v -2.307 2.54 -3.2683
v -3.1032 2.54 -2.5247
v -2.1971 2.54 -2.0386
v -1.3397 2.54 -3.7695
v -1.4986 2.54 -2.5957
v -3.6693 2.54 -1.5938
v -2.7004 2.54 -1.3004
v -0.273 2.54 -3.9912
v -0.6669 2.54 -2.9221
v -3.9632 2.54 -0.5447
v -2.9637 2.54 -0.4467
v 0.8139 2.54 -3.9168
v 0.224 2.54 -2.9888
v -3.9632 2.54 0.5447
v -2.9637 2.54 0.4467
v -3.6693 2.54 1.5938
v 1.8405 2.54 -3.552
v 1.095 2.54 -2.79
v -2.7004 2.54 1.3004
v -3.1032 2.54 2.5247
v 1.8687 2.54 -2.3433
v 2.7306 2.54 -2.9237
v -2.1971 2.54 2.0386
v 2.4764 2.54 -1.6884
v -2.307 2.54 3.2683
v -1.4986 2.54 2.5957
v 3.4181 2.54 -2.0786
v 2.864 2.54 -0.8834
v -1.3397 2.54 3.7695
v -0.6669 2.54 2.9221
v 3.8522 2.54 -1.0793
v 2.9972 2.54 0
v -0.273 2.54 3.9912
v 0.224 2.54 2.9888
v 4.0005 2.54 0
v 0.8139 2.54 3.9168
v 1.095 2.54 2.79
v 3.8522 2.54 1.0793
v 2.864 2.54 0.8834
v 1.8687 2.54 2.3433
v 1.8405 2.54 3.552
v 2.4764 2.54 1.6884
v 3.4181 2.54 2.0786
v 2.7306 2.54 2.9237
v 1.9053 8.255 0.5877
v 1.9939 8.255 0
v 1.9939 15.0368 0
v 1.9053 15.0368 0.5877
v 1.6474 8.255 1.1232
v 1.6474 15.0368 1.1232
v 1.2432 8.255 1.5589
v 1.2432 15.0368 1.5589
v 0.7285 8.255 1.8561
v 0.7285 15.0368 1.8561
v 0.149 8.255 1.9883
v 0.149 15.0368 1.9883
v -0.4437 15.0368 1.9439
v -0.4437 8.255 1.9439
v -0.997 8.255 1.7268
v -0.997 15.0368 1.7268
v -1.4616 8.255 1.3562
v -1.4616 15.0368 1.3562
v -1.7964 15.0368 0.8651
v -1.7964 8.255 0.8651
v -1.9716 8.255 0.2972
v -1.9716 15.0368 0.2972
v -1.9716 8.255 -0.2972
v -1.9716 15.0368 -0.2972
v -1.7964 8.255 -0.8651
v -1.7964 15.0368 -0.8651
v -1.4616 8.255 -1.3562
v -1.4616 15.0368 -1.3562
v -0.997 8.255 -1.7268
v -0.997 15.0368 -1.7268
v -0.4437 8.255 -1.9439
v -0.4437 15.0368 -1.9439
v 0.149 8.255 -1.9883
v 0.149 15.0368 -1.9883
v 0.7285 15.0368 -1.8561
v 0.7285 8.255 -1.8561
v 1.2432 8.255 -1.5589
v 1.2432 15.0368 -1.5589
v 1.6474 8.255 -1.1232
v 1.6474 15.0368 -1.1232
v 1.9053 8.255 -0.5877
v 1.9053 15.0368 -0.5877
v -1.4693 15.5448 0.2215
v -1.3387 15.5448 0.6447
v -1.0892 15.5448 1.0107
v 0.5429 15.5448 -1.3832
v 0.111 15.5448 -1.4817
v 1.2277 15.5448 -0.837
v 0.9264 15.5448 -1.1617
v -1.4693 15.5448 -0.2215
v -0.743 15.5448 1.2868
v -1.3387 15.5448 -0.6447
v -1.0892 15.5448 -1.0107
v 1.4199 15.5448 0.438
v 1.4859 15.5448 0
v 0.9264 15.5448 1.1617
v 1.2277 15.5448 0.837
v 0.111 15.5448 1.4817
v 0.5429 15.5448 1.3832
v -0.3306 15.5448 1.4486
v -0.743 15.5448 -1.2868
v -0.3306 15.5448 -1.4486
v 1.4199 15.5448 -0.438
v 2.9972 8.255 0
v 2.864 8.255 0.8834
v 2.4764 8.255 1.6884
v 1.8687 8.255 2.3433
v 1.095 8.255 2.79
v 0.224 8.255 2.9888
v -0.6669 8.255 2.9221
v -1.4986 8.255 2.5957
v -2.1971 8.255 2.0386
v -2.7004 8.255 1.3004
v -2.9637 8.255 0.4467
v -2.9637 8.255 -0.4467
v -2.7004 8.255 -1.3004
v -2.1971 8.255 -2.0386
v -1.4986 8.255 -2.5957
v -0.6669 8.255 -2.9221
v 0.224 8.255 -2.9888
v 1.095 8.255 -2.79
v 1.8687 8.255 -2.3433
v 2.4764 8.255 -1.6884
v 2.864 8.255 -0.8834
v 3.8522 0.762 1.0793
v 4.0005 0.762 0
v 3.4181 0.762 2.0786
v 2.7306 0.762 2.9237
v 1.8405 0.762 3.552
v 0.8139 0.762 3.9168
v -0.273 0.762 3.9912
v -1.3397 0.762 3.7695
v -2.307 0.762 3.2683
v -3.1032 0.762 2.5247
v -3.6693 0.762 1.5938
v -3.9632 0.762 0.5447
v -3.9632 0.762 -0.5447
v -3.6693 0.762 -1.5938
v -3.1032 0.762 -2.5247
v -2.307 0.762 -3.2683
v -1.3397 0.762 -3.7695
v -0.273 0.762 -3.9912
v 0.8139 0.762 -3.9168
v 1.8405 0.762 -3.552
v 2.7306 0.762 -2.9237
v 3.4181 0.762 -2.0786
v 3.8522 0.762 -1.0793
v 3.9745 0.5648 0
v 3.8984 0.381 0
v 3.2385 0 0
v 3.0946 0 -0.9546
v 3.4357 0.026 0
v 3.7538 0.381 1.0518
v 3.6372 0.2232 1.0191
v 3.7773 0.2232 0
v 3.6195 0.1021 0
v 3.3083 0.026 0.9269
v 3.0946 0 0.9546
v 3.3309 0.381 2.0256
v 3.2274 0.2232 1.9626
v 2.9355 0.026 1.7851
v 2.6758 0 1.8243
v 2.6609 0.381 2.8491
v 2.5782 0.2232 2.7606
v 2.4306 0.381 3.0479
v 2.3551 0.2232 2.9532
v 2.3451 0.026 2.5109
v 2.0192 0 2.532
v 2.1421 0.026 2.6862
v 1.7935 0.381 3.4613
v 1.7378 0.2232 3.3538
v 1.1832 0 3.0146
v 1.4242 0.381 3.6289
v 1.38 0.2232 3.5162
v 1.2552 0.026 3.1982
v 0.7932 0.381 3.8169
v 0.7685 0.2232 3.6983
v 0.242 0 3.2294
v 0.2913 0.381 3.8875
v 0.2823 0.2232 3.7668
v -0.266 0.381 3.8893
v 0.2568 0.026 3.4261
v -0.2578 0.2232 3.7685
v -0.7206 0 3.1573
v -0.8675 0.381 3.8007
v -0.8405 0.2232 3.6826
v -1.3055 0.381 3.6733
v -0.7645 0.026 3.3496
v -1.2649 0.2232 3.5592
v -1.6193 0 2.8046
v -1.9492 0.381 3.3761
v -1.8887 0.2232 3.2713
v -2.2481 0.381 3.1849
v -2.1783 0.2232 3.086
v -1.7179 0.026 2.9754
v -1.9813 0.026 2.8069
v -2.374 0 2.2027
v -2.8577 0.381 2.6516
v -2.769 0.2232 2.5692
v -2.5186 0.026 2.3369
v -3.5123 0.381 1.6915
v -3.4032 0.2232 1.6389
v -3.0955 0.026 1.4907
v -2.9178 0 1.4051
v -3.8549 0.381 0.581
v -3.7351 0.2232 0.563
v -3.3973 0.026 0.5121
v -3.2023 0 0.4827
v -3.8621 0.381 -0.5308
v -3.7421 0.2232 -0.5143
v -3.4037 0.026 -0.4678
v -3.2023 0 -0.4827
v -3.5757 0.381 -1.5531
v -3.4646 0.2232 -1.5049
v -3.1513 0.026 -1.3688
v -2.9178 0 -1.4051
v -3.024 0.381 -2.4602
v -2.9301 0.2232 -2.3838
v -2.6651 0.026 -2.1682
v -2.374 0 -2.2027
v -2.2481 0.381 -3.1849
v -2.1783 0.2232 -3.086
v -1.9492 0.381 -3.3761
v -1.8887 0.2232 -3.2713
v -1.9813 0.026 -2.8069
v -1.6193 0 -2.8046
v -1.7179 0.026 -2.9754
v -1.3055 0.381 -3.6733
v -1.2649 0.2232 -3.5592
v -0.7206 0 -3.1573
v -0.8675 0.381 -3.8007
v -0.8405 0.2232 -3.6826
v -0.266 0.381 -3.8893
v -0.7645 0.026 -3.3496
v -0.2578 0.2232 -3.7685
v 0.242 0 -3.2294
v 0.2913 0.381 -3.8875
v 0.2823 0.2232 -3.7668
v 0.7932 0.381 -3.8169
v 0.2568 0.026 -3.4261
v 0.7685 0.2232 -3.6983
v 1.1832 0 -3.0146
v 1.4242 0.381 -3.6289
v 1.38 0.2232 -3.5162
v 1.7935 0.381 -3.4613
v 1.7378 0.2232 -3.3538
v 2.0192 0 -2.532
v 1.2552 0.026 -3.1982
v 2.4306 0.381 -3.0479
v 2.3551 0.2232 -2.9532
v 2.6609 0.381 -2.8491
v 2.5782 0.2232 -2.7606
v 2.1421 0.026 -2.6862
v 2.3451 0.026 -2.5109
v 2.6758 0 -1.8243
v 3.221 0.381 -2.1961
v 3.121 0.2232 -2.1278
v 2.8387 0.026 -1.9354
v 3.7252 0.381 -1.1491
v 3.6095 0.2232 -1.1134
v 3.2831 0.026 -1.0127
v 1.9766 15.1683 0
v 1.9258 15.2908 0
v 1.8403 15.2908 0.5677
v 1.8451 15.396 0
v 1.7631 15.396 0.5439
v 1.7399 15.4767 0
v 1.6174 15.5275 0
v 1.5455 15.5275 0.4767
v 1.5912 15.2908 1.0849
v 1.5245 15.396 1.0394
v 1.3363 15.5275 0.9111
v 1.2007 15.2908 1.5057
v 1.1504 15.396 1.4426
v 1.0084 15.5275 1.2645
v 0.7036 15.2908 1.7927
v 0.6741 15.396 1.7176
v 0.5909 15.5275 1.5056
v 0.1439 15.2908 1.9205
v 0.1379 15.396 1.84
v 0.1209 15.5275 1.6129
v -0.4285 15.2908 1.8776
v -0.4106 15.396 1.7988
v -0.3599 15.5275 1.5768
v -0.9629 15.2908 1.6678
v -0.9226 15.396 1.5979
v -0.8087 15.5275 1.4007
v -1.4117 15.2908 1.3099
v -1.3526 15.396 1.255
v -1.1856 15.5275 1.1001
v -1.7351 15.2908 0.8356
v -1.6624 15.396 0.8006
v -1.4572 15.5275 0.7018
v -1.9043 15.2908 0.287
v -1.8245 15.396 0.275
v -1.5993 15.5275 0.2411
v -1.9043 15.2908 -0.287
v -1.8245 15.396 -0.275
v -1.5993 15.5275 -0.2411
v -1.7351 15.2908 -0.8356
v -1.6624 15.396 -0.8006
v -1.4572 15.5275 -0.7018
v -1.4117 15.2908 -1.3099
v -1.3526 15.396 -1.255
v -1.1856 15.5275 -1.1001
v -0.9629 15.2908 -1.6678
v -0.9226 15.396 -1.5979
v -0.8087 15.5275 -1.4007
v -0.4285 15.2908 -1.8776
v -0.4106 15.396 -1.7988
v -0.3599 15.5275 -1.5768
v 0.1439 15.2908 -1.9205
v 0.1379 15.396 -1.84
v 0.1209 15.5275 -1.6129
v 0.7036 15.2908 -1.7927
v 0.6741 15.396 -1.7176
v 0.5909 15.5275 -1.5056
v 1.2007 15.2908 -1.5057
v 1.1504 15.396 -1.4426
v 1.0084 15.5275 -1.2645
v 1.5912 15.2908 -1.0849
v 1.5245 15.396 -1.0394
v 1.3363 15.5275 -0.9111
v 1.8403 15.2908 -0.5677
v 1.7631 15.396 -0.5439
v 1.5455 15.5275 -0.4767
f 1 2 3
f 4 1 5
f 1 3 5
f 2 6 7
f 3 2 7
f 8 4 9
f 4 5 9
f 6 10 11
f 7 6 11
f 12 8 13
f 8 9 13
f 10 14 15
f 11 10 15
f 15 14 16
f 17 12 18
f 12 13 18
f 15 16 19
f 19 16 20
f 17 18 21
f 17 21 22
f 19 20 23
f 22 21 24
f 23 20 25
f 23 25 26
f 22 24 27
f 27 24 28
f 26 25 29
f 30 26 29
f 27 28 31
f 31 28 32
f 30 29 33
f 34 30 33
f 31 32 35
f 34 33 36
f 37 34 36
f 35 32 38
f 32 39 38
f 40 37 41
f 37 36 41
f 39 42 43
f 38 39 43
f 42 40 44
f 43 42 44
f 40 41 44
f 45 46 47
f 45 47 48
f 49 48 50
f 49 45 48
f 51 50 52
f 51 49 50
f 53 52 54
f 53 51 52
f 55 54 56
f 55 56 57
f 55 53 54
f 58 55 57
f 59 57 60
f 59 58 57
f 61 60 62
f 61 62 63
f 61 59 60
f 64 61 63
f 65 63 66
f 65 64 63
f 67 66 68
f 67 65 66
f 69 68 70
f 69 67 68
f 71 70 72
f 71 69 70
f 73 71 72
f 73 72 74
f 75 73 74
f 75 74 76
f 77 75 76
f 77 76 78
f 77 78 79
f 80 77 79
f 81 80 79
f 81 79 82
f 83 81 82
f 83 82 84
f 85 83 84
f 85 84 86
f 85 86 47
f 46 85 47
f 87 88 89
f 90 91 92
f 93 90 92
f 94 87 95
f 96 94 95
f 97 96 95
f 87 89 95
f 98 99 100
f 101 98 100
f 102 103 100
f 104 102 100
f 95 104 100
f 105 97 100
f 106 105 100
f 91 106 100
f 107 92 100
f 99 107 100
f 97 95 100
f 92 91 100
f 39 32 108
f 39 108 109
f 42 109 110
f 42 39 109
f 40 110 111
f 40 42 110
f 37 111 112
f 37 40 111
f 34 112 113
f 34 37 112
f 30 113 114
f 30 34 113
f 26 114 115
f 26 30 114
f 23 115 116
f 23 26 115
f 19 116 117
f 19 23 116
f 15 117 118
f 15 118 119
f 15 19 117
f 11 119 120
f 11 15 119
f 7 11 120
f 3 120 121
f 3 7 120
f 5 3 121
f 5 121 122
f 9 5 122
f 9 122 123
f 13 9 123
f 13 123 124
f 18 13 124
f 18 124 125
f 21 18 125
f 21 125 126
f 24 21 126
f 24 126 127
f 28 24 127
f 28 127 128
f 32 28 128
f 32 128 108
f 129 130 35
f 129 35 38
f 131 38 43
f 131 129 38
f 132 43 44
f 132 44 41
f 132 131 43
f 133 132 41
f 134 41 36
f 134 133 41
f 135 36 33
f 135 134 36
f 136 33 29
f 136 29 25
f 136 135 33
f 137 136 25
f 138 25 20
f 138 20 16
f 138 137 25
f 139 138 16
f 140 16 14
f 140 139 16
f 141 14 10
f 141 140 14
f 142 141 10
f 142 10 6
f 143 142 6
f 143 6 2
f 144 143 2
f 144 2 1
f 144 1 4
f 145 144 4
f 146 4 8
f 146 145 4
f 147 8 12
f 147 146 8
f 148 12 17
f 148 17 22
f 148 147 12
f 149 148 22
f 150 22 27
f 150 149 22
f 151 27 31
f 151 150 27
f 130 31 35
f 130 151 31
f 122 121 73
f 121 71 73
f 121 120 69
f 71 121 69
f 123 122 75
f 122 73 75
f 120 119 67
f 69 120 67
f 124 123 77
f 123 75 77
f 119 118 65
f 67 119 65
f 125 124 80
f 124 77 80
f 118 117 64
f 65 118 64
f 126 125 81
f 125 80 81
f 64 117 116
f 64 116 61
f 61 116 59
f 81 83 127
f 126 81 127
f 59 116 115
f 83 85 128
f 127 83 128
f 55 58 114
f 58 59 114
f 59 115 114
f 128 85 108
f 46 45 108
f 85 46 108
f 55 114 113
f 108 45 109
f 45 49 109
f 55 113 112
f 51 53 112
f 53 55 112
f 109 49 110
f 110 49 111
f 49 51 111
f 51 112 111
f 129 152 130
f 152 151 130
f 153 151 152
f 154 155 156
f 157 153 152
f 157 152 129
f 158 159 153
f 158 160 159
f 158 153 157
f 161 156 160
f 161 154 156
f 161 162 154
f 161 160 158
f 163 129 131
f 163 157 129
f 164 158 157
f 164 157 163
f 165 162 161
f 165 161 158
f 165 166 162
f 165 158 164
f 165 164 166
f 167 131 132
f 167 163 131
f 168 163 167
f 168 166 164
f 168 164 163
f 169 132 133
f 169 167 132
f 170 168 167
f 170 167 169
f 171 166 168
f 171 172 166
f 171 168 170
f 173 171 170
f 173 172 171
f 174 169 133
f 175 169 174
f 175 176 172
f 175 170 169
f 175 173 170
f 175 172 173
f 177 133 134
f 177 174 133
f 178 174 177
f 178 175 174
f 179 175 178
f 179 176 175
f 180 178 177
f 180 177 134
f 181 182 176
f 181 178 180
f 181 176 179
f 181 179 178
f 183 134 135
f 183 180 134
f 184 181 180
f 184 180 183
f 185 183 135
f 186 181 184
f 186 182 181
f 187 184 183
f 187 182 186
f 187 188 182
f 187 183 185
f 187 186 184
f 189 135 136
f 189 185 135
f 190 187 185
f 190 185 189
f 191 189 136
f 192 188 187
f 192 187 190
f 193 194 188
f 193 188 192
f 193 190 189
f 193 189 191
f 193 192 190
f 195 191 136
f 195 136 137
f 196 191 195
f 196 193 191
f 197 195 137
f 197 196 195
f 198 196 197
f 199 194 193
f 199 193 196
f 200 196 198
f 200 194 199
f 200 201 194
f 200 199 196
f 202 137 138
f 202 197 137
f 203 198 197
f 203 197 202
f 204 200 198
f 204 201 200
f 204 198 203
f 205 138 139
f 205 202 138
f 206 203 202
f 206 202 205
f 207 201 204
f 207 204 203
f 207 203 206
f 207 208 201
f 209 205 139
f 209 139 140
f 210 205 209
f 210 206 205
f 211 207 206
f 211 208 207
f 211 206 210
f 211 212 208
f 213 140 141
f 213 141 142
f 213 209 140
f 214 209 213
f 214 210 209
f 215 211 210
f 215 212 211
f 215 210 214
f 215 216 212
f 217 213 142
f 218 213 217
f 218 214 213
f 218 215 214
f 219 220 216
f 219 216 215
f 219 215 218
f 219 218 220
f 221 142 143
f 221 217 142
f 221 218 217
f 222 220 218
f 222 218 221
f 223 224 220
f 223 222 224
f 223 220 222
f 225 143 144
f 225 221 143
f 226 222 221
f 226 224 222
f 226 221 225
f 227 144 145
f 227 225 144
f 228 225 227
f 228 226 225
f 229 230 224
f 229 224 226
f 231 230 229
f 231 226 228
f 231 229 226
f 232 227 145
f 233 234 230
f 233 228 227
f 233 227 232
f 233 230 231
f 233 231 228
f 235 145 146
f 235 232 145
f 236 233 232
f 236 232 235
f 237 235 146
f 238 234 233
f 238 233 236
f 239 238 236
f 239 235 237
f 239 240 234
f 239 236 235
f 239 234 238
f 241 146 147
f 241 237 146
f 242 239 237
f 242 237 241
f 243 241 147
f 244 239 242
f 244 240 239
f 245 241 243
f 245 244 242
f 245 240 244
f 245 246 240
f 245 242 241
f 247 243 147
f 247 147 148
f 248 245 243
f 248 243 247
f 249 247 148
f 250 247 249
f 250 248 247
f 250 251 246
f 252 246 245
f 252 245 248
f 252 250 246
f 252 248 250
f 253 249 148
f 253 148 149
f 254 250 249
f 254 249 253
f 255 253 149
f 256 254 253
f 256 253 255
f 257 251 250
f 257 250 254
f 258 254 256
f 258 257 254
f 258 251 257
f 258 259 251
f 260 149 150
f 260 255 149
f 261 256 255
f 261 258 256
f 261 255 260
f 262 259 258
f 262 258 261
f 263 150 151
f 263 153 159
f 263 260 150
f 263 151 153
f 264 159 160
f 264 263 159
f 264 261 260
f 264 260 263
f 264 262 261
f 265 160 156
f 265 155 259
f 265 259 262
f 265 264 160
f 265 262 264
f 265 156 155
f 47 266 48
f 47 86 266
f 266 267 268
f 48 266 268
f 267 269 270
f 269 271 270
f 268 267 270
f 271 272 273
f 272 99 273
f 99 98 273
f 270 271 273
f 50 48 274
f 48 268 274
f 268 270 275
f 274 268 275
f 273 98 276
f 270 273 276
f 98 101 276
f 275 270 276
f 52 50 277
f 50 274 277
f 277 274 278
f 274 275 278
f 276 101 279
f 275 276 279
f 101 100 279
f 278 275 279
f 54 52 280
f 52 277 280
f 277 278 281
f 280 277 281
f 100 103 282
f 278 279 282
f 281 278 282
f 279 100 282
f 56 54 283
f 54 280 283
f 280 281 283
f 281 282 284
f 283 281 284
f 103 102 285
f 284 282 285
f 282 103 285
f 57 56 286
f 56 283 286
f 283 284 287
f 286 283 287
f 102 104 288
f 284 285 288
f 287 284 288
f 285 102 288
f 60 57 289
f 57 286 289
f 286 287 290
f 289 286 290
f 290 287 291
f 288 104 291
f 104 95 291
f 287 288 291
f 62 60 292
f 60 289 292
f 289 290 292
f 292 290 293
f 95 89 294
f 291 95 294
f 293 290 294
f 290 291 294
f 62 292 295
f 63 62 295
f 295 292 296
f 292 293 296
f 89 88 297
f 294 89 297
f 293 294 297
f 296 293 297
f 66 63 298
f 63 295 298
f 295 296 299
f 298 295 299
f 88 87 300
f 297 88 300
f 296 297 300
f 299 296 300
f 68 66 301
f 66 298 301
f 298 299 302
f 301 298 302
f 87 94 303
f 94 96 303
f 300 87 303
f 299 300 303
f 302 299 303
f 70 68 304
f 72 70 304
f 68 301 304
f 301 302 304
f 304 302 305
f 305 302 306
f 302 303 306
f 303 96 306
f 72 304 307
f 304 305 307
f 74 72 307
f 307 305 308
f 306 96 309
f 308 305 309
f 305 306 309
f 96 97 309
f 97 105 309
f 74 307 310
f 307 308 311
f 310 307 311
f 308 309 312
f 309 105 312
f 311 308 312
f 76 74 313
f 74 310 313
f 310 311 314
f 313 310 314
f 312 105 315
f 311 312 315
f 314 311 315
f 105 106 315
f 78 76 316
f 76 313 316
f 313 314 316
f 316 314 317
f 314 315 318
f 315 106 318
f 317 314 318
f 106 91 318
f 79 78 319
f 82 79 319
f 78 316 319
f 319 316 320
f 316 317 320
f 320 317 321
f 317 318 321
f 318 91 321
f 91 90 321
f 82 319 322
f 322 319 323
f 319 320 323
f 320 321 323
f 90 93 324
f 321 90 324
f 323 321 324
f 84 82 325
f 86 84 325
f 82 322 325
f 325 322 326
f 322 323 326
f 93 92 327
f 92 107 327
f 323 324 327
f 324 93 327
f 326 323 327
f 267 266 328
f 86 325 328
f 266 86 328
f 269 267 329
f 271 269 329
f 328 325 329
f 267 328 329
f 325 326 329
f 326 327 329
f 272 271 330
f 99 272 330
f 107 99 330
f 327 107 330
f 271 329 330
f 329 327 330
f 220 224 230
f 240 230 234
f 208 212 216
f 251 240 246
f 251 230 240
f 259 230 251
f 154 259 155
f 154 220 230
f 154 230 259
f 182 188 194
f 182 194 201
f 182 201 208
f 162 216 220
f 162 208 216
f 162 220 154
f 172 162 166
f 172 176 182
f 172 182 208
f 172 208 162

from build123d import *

# Parameters (mm, degrees)
F0_R     = 2.9972
F1_DEPTH = 8.255
F0_R_2   = 4.0005
F2_DEPTH = 2.54
F3_R     = 1.9939
F4_DEPTH = 15.5448
F5_R     = 0.508
F6_R     = 0.762


with BuildPart() as f1:
    # F0 (on Front) → F1 (new body)
    with BuildSketch(Plane.XZ):
        Circle(F0_R)
    extrude(amount=-F1_DEPTH)

    # F0 (on Front) → F2 (join)
    with BuildSketch(Plane.XZ):
        Circle(F0_R_2)
        Circle(F0_R, mode=Mode.SUBTRACT)
    extrude(amount=-F2_DEPTH)

    # F3 (on Front) → F4 (join)
    with BuildSketch(Plane.XZ):
        Circle(F3_R)
    extrude(amount=-F4_DEPTH)

    # F5
    f5_edges = [f1.edges().sort_by_distance(p)[0] for p in [
        (-1.9939, 15.5448, 0),
    ]]
    fillet(f5_edges, radius=F5_R)

    # F6
    f6_edges = [f1.edges().sort_by_distance(p)[0] for p in [
        (-4.0005, 0, 0),
    ]]
    fillet(f6_edges, radius=F6_R)


solid = f1.part
